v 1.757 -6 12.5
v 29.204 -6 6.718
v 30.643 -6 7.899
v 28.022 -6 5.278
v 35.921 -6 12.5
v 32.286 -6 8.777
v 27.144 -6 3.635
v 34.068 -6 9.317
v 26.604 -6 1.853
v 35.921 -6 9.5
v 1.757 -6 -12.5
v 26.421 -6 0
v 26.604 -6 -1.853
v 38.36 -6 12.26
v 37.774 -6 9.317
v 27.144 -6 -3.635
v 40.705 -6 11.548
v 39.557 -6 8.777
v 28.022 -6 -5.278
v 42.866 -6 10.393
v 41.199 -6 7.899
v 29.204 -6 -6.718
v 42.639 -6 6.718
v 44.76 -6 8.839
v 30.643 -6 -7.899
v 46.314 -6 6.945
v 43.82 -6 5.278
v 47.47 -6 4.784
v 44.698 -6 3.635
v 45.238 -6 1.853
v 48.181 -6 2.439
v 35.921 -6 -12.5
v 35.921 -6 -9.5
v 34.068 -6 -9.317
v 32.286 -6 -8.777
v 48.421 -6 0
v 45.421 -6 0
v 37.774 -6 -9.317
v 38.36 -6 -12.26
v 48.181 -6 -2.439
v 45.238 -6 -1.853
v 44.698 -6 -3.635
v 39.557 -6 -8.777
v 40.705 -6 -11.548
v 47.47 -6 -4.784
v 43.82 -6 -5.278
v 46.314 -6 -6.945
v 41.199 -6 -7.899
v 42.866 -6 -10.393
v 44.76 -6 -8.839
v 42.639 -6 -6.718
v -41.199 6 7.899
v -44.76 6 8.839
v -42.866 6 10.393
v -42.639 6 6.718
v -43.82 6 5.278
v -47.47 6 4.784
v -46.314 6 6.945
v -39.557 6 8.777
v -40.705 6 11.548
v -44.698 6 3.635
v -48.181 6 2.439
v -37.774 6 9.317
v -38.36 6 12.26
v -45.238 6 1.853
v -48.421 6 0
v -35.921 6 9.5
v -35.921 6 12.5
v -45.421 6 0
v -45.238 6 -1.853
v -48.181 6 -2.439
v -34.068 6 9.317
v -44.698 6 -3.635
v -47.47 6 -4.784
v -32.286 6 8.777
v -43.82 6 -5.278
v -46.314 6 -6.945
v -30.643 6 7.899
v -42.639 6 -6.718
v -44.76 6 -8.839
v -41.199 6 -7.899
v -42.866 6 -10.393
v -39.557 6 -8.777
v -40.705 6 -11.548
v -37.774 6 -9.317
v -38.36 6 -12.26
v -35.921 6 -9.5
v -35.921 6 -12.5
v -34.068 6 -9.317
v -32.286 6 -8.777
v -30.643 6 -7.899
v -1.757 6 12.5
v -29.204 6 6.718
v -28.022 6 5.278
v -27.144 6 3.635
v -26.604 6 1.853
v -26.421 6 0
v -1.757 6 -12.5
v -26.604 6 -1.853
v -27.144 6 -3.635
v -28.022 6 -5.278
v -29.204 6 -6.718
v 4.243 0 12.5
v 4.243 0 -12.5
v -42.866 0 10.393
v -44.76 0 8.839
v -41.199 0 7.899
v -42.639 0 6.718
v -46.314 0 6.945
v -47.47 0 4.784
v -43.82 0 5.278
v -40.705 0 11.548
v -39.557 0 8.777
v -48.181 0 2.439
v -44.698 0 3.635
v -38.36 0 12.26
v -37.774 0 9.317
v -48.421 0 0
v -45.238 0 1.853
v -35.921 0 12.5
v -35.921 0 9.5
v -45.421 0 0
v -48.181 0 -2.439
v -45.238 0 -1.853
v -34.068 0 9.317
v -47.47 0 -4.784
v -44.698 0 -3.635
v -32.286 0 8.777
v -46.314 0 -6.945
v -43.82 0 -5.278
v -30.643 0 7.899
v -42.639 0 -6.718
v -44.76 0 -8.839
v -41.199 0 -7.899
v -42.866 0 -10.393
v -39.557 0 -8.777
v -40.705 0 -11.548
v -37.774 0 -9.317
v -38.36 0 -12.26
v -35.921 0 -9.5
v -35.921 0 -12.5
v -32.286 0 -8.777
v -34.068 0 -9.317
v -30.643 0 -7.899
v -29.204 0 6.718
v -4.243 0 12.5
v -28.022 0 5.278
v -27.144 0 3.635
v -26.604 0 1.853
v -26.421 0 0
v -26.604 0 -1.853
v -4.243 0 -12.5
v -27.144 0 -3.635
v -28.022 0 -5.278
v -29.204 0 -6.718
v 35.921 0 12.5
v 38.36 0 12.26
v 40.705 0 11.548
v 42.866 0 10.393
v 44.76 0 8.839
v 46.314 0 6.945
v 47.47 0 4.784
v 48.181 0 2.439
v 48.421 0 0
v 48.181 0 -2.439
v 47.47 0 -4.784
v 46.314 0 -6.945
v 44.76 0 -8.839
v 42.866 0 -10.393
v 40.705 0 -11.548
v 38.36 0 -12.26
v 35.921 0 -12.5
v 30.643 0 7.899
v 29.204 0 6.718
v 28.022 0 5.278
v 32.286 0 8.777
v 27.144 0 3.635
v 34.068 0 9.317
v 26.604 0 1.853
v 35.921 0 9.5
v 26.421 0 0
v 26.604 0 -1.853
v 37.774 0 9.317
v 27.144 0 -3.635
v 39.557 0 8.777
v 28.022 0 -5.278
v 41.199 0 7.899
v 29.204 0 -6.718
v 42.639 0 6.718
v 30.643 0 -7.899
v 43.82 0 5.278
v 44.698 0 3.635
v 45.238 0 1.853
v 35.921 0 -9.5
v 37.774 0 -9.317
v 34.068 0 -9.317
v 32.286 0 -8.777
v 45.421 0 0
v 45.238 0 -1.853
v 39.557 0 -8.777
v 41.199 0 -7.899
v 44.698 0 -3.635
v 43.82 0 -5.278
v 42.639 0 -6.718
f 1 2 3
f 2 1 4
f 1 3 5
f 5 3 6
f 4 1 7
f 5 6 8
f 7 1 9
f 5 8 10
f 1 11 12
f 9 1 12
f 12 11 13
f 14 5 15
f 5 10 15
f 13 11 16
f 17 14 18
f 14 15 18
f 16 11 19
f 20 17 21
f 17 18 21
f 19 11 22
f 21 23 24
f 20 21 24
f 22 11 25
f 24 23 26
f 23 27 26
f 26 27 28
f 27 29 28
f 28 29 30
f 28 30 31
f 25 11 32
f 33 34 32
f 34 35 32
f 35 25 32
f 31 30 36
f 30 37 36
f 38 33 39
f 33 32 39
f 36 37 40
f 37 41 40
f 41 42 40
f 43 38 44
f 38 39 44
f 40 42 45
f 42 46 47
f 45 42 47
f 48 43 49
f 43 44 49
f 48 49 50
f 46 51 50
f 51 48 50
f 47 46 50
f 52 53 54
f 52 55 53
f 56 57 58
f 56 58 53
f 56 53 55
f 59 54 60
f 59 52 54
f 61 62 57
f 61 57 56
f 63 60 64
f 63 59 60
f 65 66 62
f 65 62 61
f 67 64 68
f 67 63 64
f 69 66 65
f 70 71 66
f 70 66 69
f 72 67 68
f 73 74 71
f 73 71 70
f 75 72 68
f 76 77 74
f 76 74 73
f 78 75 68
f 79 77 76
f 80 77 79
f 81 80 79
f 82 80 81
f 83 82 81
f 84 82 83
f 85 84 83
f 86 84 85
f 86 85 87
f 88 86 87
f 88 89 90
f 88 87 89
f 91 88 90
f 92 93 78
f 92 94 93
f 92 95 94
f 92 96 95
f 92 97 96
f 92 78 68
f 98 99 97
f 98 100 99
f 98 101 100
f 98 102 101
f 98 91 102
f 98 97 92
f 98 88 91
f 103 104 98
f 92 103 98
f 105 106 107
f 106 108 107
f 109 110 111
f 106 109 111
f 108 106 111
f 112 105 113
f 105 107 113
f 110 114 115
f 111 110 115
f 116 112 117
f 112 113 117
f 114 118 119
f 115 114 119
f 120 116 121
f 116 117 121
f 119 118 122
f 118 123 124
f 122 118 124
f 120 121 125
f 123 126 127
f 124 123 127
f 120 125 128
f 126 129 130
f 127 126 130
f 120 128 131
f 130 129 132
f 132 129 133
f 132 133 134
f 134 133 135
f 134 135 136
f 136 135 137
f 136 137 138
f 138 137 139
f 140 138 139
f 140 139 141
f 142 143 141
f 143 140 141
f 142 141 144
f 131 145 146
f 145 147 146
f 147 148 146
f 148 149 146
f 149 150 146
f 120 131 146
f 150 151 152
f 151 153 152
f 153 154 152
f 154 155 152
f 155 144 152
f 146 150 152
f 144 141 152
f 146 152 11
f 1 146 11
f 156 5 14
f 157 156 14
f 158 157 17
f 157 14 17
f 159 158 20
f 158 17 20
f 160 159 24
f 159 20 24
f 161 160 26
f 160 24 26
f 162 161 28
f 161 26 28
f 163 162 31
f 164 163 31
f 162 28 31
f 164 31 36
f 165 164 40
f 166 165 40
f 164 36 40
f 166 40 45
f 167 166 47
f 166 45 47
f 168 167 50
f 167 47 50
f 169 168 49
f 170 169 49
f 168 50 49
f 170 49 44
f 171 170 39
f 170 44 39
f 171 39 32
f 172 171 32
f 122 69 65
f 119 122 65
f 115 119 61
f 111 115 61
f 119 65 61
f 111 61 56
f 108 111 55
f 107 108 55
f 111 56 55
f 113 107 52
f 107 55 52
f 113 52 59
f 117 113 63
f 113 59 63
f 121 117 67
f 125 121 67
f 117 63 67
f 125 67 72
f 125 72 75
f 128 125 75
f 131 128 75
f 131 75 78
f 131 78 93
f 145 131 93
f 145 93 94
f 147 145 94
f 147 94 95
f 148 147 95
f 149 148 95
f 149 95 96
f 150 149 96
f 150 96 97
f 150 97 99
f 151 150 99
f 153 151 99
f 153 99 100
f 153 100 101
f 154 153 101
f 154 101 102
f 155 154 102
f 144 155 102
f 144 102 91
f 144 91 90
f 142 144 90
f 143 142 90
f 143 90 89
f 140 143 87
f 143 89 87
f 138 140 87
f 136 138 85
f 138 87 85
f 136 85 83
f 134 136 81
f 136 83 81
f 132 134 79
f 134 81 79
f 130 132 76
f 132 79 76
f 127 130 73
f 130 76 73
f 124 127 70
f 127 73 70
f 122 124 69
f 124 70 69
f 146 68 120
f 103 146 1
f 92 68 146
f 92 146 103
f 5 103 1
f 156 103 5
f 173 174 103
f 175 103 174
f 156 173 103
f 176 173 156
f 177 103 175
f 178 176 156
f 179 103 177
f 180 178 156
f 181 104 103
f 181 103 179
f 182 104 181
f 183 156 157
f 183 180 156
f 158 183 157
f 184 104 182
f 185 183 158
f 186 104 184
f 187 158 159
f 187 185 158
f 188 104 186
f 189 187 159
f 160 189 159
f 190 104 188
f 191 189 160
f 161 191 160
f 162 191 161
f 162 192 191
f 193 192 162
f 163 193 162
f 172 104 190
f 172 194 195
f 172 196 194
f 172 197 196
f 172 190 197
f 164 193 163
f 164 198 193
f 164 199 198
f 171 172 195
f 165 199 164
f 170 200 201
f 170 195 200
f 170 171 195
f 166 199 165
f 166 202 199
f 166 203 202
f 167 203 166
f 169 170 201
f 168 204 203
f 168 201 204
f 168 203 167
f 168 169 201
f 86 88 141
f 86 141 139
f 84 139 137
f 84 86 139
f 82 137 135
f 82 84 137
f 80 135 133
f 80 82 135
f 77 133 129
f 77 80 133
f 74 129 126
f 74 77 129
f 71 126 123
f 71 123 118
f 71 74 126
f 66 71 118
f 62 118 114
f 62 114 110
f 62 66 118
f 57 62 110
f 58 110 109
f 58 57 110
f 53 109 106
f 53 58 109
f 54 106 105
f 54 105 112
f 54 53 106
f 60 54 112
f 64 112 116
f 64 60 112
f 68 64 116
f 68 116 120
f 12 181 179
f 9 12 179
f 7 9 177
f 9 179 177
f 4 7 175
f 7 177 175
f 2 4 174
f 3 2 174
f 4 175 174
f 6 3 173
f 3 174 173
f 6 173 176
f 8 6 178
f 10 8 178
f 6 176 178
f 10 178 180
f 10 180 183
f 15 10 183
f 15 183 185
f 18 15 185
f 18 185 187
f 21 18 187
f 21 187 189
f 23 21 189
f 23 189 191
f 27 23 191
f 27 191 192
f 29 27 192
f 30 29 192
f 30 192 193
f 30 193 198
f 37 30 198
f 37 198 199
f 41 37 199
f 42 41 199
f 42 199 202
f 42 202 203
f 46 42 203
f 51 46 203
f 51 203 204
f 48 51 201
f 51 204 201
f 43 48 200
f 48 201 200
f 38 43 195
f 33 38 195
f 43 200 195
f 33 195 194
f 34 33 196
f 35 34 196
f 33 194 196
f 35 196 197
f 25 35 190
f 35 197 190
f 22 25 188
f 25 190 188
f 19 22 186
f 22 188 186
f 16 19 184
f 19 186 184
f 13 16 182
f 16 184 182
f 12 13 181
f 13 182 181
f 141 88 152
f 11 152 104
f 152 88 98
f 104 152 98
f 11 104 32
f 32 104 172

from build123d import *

# Parameters (mm, degrees)
EXTRUDE_THIN1_DEPTH = 12.5
BOSS_EXTRUDE1_DEPTH = 6
BOSS_EXTRUDE2_START = -12
BOSS_EXTRUDE2_DEPTH = 6
SKETCH4_R           = 9.5
CUT_EXTRUDE1_DEPTH  = 52.428062496


with BuildPart() as part:
    # Sketch1 → Extrude-Thin1 (new, symmetric)
    with BuildSketch(Plane.XY):
        Polygon((-35.921024484, 0), (-4.242640687, 0), (1.757359313, -6), (35.921024484, -6), (35.921024484, 0), (4.242640687, 0), (-1.757359313, 6), (-35.921024484, 6), align=None)
    extrude(amount=EXTRUDE_THIN1_DEPTH, both=True)

    # Sketch3 → Boss-Extrude1 (add)
    with BuildSketch(Plane(origin=(0, 6, 0), x_dir=(1, 0, 0), z_dir=(0, 1, 0))):
        with BuildLine():
            ThreePointArc((-35.921024484, 12.5), (-48.421024484, 0), (-35.921024484, -12.5))
            Line((-35.921024484, -12.5), (-35.921024484, 12.5))
        make_face()
    extrude(amount=-BOSS_EXTRUDE1_DEPTH)

    # Sketch3<3> → Boss-Extrude2 (add)
    with BuildSketch(Plane(origin=(0, 6, 0), x_dir=(1, 0, 0), z_dir=(0, 1, 0)).offset(BOSS_EXTRUDE2_START)):
        with BuildLine():
            Line((35.921024484, 12.5), (35.921024484, -12.5))
            ThreePointArc((35.921024484, -12.5), (48.421024484, 0), (35.921024484, 12.5))
        make_face()
    extrude(amount=BOSS_EXTRUDE2_DEPTH)

    # Sketch4 → Cut-Extrude1 (cut, through all)
    with BuildSketch(Plane(origin=(0, 6, 0), x_dir=(1, 0, 0), z_dir=(0, 1, 0))):
        with Locations(Location((-35.921024484, 0, 0), (0, 0, 180))):
            Circle(SKETCH4_R)
        with Locations(Location((35.921024484, 0, 0), (0, 0, 180))):
            Circle(SKETCH4_R)
    extrude(amount=-CUT_EXTRUDE1_DEPTH, mode=Mode.SUBTRACT)


solid = part.part
